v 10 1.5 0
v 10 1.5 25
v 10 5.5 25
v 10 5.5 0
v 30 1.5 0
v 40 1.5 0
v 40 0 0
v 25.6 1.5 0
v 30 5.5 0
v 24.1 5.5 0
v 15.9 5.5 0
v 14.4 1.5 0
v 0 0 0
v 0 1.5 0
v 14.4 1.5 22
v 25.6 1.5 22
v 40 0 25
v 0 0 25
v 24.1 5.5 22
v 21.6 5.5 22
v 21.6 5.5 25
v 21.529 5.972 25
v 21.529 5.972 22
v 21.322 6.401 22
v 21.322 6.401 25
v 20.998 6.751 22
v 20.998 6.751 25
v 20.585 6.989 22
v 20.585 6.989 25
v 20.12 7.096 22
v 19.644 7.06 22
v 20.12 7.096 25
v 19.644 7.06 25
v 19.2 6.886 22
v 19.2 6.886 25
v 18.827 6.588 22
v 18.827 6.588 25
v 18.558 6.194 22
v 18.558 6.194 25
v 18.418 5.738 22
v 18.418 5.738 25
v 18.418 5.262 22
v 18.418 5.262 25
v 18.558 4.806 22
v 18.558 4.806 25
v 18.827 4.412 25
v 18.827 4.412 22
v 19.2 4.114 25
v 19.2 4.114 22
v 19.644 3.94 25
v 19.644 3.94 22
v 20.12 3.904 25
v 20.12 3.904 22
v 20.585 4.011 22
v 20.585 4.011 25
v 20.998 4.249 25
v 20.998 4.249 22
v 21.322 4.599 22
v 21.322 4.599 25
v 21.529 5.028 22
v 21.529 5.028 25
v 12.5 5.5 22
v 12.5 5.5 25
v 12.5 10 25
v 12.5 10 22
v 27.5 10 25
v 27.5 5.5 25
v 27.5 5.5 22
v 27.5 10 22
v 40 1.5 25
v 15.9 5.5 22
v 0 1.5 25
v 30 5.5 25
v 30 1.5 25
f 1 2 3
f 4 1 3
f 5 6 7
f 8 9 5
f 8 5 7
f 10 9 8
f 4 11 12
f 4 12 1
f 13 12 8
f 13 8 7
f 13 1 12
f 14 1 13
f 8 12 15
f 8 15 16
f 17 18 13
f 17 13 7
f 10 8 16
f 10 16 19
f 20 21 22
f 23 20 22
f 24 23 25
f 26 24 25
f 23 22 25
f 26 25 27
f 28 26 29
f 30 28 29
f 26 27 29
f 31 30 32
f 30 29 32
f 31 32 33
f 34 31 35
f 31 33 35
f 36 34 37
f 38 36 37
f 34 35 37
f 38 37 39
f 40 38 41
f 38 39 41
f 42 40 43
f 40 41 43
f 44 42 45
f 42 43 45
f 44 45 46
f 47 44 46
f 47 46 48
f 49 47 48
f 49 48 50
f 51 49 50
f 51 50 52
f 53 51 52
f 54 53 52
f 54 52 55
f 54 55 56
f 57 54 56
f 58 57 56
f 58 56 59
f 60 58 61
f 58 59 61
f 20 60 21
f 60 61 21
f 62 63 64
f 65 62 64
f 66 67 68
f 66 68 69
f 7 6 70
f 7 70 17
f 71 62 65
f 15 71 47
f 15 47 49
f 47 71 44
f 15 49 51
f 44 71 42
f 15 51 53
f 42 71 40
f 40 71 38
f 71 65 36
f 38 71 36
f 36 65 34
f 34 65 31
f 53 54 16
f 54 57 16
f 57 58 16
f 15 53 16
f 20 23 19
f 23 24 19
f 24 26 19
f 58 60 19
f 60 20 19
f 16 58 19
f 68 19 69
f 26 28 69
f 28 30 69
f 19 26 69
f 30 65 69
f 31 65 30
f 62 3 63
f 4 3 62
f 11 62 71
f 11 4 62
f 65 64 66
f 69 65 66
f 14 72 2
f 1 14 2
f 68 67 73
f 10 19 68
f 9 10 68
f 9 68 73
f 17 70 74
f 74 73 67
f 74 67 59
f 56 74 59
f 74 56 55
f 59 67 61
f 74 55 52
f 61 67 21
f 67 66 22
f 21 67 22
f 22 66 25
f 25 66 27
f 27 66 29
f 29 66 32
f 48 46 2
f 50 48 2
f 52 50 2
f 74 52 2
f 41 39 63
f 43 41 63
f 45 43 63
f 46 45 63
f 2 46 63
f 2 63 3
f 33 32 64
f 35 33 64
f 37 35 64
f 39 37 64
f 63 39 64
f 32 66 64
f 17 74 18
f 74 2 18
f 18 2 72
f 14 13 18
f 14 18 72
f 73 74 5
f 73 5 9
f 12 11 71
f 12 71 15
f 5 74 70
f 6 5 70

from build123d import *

# Parameters (mm, degrees)
SALIENTE_EXTRUIR1_DEPTH = 25
CROQUIS2_W              = 15
CROQUIS2_H              = 10
CROQUIS2_R              = 1.6
SALIENTE_EXTRUIR2_DEPTH = 3
CROQUIS3_W              = 10
CROQUIS3_H              = 4
CORTAR_EXTRUIR1_DEPTH   = 33


with BuildPart() as part:
    # Croquis1 → Saliente-Extruir1 (new body)
    with BuildSketch(Plane.XY):
        Polygon((15.9, 5.5), (14.4, 1.5), (25.6, 1.5), (24.1, 5.5), (40, 5.5), (40, 0), (0, 0), (0, 5.5), align=None)
    extrude(amount=SALIENTE_EXTRUIR1_DEPTH)

    # Croquis2 → Saliente-Extruir2 (add)
    with BuildSketch(Plane.XY.offset(25)):
        with Locations((20, 5)):
            Rectangle(CROQUIS2_W, CROQUIS2_H)
        with Locations((20, 5.5)):
            Circle(CROQUIS2_R, mode=Mode.SUBTRACT)
    extrude(amount=-SALIENTE_EXTRUIR2_DEPTH)

    # Croquis3 → Cortar-Extruir1 (cut)
    with BuildSketch(Plane.XY.offset(25)):
        with Locations((5, 3.5)):
            Rectangle(CROQUIS3_W, CROQUIS3_H)
        with Locations((35, 3.5)):
            Rectangle(CROQUIS3_W, CROQUIS3_H)
    extrude(amount=-CORTAR_EXTRUIR1_DEPTH, mode=Mode.SUBTRACT)


solid = part.part
